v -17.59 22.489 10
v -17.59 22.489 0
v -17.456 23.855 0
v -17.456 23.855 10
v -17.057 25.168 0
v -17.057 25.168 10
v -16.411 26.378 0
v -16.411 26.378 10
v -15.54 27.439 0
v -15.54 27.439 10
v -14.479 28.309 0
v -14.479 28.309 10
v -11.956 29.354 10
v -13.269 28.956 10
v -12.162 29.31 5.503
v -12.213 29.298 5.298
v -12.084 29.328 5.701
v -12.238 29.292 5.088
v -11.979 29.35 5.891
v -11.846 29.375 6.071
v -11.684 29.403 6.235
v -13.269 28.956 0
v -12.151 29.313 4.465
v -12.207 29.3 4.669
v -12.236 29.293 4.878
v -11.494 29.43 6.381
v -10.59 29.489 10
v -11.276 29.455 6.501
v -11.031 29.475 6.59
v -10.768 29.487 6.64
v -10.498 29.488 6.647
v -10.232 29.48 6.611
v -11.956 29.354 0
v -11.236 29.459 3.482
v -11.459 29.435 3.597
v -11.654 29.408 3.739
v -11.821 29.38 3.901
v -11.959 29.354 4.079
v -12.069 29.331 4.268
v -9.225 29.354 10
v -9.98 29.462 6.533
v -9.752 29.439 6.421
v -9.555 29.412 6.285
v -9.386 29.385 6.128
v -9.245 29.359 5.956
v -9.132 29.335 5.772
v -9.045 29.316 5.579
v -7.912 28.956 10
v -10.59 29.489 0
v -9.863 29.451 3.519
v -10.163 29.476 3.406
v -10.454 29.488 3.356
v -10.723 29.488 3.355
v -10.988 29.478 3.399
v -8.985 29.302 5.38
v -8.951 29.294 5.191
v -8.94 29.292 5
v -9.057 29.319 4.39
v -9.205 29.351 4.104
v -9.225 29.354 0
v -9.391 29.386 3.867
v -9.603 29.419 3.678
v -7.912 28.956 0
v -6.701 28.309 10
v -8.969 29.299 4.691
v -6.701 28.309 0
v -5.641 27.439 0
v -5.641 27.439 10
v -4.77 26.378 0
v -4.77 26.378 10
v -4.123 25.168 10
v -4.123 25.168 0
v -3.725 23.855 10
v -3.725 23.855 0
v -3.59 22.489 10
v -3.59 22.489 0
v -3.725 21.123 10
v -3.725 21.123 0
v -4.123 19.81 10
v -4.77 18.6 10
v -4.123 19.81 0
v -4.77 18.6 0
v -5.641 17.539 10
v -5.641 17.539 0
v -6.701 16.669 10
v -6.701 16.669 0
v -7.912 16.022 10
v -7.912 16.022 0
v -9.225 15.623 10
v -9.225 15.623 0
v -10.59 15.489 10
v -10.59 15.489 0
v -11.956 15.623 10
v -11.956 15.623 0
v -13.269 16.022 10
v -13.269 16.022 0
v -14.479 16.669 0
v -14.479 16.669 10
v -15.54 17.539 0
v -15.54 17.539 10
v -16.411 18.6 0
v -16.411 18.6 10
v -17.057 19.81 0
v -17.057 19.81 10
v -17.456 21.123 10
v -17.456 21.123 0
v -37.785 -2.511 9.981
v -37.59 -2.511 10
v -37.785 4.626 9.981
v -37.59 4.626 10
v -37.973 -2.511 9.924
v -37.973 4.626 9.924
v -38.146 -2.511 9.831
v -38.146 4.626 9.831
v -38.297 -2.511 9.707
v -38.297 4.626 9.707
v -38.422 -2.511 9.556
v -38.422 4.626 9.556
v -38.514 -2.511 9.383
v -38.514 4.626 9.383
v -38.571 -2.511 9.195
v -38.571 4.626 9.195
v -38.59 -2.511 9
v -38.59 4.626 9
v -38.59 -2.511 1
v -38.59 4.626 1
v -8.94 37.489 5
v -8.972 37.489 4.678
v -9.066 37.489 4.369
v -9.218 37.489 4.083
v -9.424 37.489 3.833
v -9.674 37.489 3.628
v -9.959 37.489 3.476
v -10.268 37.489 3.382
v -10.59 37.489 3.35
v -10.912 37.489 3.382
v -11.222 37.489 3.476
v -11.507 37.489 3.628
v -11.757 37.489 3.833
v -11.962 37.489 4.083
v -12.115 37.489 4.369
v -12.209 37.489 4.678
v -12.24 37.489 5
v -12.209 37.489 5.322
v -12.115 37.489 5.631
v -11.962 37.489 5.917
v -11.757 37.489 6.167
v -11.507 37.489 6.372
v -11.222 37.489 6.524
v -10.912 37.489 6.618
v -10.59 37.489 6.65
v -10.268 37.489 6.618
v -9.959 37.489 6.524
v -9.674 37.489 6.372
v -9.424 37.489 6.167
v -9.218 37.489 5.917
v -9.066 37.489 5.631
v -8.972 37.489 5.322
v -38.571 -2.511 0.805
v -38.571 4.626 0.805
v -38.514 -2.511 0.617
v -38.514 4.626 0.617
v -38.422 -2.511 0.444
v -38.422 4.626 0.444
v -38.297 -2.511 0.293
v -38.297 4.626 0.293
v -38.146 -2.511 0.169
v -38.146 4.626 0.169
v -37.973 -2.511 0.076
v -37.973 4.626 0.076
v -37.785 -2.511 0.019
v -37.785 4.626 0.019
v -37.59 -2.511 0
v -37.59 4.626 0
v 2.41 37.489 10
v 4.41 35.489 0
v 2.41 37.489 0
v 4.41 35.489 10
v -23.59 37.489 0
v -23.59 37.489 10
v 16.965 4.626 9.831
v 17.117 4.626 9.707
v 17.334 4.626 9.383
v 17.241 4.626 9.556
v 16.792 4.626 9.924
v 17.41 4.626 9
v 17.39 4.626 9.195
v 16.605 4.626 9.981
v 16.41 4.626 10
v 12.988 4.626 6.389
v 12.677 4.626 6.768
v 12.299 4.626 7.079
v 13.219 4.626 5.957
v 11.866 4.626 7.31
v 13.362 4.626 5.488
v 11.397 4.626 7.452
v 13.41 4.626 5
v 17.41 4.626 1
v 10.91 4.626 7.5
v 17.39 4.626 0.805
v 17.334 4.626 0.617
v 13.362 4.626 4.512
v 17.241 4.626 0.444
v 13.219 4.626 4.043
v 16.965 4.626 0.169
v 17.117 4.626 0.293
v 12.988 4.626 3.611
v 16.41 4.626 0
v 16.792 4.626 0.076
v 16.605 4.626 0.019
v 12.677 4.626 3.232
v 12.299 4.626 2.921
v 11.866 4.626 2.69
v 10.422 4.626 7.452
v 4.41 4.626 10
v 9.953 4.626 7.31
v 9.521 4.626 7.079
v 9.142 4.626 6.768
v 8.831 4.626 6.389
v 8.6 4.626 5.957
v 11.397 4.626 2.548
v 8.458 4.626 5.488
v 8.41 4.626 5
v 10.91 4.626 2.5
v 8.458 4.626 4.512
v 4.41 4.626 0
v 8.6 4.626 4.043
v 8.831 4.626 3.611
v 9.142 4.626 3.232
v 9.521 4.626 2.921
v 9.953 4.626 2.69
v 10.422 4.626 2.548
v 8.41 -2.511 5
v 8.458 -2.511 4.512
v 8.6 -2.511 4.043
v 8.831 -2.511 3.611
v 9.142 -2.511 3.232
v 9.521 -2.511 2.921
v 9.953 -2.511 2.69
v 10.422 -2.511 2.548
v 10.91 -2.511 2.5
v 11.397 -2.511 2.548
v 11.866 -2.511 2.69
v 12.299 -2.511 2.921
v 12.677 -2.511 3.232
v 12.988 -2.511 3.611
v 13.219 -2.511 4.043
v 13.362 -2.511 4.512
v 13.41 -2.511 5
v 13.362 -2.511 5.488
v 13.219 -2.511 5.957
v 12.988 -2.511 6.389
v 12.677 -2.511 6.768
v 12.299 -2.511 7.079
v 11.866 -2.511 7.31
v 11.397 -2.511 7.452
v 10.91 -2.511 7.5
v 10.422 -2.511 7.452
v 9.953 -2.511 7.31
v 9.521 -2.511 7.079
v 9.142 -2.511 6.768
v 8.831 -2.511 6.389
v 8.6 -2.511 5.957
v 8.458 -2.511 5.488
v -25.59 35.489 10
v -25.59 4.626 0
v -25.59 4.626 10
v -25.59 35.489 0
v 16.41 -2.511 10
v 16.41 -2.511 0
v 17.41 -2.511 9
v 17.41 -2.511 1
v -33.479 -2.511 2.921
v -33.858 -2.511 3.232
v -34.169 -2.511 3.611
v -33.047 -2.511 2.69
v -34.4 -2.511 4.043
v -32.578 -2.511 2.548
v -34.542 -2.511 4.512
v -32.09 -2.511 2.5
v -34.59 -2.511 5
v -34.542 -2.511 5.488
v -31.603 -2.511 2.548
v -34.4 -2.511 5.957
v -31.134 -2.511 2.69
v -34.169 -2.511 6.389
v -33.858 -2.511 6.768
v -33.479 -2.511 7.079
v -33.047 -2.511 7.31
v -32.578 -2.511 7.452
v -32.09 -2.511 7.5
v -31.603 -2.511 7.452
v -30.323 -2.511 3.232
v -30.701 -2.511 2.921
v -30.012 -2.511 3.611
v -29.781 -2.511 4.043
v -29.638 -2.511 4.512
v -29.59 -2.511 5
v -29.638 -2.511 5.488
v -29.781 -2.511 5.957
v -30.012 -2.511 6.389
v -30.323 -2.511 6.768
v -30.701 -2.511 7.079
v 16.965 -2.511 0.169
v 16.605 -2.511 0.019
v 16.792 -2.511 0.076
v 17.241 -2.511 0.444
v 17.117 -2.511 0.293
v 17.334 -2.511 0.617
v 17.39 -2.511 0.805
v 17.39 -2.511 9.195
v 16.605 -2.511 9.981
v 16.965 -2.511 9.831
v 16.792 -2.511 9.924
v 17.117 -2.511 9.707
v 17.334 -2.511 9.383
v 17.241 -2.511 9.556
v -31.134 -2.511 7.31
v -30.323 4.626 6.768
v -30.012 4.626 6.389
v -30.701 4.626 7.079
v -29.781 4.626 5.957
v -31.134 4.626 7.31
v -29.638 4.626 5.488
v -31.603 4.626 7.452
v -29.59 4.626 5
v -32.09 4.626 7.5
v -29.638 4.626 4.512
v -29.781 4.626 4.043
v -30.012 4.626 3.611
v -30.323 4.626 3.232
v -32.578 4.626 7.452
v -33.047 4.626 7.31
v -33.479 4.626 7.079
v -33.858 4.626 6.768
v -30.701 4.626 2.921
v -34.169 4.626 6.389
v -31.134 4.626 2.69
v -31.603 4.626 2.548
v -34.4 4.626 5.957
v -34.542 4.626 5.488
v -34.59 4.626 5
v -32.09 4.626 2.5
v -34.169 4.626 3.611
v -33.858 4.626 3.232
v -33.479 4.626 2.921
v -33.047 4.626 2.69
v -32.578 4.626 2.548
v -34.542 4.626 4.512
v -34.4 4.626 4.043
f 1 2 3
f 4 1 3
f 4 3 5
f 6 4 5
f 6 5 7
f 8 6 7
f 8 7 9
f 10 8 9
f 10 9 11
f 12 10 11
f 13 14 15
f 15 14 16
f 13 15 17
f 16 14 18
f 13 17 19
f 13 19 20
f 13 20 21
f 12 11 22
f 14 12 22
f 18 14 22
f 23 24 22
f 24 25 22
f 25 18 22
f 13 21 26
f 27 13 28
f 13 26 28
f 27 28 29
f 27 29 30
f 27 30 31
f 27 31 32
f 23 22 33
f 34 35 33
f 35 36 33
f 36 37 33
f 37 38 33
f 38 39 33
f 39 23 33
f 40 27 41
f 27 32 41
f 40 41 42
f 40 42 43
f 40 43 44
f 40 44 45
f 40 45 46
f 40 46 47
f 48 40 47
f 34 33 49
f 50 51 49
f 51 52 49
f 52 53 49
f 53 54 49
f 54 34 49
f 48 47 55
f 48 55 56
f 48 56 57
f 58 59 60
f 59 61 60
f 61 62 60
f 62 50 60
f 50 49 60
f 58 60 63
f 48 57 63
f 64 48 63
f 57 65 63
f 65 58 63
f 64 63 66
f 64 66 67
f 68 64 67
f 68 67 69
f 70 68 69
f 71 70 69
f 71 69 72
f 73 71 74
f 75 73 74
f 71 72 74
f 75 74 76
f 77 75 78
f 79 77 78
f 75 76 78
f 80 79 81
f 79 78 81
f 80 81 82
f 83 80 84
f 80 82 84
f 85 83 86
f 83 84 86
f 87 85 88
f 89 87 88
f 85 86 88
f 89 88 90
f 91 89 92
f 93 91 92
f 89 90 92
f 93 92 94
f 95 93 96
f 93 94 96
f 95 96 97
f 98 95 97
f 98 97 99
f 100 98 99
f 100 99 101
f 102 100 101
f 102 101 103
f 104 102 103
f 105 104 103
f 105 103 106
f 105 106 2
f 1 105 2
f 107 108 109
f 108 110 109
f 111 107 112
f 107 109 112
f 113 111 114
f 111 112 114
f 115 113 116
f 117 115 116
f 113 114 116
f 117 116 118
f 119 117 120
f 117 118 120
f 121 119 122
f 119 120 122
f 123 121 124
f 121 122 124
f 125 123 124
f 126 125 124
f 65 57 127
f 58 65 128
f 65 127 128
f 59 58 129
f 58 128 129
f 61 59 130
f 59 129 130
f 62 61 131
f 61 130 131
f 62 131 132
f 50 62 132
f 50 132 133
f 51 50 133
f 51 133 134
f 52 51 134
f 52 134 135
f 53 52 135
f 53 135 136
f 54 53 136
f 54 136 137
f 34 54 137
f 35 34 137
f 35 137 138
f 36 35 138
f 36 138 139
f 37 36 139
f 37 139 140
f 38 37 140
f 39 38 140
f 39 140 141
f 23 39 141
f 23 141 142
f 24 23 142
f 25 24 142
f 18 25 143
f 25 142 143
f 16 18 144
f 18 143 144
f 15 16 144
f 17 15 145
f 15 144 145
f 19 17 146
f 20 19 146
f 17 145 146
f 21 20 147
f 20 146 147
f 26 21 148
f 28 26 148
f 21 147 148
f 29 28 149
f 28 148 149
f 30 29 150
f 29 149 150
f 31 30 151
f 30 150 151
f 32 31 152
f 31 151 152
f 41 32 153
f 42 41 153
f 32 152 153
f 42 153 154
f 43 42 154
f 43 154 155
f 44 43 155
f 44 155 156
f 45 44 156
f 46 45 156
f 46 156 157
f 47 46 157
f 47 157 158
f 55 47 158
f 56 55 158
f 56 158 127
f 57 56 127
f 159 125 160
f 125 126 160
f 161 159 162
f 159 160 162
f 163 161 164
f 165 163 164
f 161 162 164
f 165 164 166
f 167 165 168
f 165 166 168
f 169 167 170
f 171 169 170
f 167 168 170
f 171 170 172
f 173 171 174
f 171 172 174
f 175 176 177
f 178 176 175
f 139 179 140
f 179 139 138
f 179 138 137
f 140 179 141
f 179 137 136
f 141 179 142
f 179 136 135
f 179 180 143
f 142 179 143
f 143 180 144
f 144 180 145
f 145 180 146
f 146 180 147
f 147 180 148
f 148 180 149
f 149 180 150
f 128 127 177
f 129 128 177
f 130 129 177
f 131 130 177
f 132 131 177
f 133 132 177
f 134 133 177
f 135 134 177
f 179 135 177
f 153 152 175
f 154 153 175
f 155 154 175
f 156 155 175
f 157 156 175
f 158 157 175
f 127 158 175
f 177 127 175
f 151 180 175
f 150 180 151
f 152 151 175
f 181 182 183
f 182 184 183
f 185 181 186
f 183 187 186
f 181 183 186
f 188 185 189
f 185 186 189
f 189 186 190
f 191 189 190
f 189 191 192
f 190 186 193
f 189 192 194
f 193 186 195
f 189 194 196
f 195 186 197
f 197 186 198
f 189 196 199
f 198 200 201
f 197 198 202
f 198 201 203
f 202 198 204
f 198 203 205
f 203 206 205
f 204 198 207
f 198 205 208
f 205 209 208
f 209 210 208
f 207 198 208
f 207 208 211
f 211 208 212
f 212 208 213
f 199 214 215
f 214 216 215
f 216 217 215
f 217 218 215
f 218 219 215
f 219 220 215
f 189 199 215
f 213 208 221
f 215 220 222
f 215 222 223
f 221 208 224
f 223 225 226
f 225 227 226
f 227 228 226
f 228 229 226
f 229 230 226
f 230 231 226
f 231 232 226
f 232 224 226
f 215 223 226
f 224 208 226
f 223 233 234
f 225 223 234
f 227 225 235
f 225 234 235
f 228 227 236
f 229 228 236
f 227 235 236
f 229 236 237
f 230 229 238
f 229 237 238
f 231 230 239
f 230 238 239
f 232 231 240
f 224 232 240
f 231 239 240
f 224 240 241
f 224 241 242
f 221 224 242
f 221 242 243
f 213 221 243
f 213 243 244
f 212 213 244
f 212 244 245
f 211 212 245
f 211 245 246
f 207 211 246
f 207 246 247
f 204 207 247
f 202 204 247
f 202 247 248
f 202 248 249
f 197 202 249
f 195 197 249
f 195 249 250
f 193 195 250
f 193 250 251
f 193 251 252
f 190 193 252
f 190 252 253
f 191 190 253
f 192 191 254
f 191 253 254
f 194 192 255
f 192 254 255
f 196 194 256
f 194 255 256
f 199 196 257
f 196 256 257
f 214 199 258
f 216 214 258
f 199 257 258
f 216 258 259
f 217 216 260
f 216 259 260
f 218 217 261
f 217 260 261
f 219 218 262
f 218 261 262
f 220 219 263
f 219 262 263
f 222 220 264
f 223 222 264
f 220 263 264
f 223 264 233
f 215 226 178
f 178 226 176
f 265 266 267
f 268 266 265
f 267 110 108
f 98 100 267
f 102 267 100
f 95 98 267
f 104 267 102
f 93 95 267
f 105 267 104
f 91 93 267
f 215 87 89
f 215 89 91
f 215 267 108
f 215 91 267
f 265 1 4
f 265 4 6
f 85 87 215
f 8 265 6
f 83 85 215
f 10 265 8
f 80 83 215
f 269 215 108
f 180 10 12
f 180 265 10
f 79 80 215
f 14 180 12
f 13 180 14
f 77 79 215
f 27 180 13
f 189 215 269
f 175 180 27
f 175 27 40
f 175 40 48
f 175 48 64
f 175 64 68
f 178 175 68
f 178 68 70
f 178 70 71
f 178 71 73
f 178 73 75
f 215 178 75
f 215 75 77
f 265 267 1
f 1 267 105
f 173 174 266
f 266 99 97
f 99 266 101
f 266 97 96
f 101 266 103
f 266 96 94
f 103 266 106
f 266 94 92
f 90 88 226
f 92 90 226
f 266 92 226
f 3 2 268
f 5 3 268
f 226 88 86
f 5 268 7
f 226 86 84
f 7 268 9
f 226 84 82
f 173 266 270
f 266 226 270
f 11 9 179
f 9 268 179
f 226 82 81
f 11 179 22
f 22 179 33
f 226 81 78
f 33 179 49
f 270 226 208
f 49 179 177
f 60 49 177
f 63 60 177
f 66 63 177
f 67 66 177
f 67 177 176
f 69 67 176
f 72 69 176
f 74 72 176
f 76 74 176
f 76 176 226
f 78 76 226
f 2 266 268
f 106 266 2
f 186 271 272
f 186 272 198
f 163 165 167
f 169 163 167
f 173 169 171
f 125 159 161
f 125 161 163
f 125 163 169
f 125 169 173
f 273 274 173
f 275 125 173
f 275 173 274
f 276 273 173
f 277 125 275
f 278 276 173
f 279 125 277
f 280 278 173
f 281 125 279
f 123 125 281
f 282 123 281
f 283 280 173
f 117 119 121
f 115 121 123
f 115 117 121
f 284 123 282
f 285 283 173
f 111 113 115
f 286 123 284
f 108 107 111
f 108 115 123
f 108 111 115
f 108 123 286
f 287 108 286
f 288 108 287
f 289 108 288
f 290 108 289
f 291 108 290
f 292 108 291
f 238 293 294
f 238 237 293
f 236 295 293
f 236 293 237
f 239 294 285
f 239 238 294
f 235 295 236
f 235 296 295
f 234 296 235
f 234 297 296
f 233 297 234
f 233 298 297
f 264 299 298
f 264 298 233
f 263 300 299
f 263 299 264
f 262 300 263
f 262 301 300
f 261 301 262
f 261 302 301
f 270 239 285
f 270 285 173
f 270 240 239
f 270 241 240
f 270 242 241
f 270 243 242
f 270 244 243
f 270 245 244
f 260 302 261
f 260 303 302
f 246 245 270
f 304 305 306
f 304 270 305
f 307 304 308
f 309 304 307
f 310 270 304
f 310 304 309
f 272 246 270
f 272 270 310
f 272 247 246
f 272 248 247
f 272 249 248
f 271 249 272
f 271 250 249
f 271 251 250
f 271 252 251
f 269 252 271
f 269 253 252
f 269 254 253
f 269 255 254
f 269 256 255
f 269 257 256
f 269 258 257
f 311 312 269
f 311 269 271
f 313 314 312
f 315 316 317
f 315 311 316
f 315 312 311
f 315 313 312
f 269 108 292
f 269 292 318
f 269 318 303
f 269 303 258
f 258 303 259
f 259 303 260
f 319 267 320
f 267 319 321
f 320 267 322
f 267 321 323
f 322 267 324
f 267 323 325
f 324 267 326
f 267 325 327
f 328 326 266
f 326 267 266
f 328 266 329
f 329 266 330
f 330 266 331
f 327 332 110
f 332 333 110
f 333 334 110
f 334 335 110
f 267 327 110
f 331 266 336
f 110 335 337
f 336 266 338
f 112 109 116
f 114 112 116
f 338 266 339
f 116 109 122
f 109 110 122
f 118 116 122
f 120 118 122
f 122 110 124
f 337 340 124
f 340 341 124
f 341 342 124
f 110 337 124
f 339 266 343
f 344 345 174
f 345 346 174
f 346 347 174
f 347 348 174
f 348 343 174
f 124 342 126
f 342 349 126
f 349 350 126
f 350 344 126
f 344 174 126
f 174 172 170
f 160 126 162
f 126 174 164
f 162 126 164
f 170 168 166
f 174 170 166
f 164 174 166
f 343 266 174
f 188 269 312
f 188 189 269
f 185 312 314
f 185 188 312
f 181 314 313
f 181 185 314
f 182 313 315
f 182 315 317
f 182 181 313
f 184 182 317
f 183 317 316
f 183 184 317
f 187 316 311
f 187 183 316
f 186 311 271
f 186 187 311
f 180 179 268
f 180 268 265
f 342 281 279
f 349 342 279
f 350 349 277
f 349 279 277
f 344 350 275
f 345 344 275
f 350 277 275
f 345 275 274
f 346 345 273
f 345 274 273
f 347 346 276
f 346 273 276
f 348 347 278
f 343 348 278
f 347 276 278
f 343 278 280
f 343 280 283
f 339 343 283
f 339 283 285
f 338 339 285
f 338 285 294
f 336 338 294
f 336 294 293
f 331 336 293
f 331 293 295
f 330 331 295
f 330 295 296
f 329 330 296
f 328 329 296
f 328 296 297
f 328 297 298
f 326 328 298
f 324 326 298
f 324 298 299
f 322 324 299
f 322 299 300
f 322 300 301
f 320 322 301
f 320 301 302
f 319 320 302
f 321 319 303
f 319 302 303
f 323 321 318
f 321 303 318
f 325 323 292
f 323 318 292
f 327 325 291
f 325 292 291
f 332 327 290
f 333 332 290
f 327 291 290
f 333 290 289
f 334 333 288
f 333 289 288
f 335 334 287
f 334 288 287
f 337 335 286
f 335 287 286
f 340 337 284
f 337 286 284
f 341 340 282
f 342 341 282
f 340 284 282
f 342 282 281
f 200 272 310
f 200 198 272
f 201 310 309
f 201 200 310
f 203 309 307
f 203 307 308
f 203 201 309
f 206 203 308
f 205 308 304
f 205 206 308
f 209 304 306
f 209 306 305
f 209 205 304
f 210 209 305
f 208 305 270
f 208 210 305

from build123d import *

# Parameters (mm, degrees)
SKETCH1_W                       = 56
SKETCH1_H                       = 40
BOSS_EXTRUDE1_DEPTH             = 10
SKETCH2_W                       = 13
SKETCH2_H                       = 32.863436123
CUT_EXTRUDE1_DEPTH              = 55.723267722
SKETCH3_W                       = 13
SKETCH3_H                       = 32.863436123
CUT_EXTRUDE2_DEPTH              = 55.723267722
F_14_0_14_DIAMETER_HOLE1_D      = 14
F_3_3_3_3_DIAMETER_HOLE1_REACH  = 58.473
F_3_3_3_3_DIAMETER_HOLE1_BORE_R = 1.65
F_5_0_5_DIAMETER_HOLE1_D        = 5
CHAMFER1_SIZE                   = 2
FILLET1_R                       = 1


with BuildPart() as part:
    # Sketch1 → Boss-Extrude1 (new body)
    with BuildSketch(Plane.XY.offset(10)):
        with Locations((-10.59030837, 17.488986784)):
            Rectangle(SKETCH1_W, SKETCH1_H)
    extrude(amount=-BOSS_EXTRUDE1_DEPTH)

    # Sketch2 → Cut-Extrude1 (cut, through all)
    with BuildSketch(Plane(origin=(0, 0, 0), x_dir=(-1, 0, 0), z_dir=(0, 0, -1))):
        with Locations((32.09030837, 21.057268723)):
            Rectangle(SKETCH2_W, SKETCH2_H)
    extrude(amount=-CUT_EXTRUDE1_DEPTH, mode=Mode.SUBTRACT)

    # Sketch3 → Cut-Extrude2 (cut, through all)
    with BuildSketch(Plane(origin=(0, 0, 0), x_dir=(-1, 0, 0), z_dir=(0, 0, -1))):
        with Locations((-10.90969163, 21.057268723)):
            Rectangle(SKETCH3_W, SKETCH3_H)
    extrude(amount=-CUT_EXTRUDE2_DEPTH, mode=Mode.SUBTRACT)

    # Ø14.0 (14) Diameter Hole1 (through all)
    with Locations(Plane.XY.offset(10)):
        with Locations((-10.59030837, 22.488986784)):
            Hole(F_14_0_14_DIAMETER_HOLE1_D / 2)

    # Ø3.3 (3.3) Diameter Hole1 bore → Ø3.3 (3.3) Diameter Hole1 (cut, up to next)
    with BuildSketch(Plane(origin=(0, 37.488986784, 0), x_dir=(1, 0, 0), z_dir=(0, 1, 0)), mode=Mode.PRIVATE) as f_3_3_3_3_diameter_hole1_sk1:
        with Locations((-10.59030837, -5)):
            Circle(F_3_3_3_3_DIAMETER_HOLE1_BORE_R)
    f_3_3_3_3_diameter_hole1_tool1 = extrude(f_3_3_3_3_diameter_hole1_sk1.sketch, amount=-F_3_3_3_3_DIAMETER_HOLE1_REACH, mode=Mode.PRIVATE) & part.part
    add(f_3_3_3_3_diameter_hole1_tool1.solids().sort_by_distance((-10.590308, 37.488987, 5))[0], mode=Mode.SUBTRACT)

    # Ø5.0 (5) Diameter Hole1 (through all)
    with Locations(Plane(origin=(0, 4.625550661, 0), x_dir=(1, 0, 0), z_dir=(0, 1, 0))):
        with Locations((-32.09030837, -5), (10.90969163, -5)):
            Hole(F_5_0_5_DIAMETER_HOLE1_D / 2)

    # Chamfer1
    chamfer1_edges = [part.edges().sort_by_distance(p)[0] for p in [
        (-25.59030837, 37.488986784, 5),
        (4.40969163, 37.488986784, 5),
    ]]
    chamfer(chamfer1_edges, length=CHAMFER1_SIZE)

    # Fillet1
    fillet1_edges = [part.edges().sort_by_distance(p)[0] for p in [
        (17.40969163, 1.057268722, 0),
        (-38.59030837, 1.057268722, 10),
        (-38.59030837, 1.057268722, 0),
        (17.40969163, 1.057268722, 10),
    ]]
    fillet(fillet1_edges, radius=FILLET1_R)


solid = part.part
